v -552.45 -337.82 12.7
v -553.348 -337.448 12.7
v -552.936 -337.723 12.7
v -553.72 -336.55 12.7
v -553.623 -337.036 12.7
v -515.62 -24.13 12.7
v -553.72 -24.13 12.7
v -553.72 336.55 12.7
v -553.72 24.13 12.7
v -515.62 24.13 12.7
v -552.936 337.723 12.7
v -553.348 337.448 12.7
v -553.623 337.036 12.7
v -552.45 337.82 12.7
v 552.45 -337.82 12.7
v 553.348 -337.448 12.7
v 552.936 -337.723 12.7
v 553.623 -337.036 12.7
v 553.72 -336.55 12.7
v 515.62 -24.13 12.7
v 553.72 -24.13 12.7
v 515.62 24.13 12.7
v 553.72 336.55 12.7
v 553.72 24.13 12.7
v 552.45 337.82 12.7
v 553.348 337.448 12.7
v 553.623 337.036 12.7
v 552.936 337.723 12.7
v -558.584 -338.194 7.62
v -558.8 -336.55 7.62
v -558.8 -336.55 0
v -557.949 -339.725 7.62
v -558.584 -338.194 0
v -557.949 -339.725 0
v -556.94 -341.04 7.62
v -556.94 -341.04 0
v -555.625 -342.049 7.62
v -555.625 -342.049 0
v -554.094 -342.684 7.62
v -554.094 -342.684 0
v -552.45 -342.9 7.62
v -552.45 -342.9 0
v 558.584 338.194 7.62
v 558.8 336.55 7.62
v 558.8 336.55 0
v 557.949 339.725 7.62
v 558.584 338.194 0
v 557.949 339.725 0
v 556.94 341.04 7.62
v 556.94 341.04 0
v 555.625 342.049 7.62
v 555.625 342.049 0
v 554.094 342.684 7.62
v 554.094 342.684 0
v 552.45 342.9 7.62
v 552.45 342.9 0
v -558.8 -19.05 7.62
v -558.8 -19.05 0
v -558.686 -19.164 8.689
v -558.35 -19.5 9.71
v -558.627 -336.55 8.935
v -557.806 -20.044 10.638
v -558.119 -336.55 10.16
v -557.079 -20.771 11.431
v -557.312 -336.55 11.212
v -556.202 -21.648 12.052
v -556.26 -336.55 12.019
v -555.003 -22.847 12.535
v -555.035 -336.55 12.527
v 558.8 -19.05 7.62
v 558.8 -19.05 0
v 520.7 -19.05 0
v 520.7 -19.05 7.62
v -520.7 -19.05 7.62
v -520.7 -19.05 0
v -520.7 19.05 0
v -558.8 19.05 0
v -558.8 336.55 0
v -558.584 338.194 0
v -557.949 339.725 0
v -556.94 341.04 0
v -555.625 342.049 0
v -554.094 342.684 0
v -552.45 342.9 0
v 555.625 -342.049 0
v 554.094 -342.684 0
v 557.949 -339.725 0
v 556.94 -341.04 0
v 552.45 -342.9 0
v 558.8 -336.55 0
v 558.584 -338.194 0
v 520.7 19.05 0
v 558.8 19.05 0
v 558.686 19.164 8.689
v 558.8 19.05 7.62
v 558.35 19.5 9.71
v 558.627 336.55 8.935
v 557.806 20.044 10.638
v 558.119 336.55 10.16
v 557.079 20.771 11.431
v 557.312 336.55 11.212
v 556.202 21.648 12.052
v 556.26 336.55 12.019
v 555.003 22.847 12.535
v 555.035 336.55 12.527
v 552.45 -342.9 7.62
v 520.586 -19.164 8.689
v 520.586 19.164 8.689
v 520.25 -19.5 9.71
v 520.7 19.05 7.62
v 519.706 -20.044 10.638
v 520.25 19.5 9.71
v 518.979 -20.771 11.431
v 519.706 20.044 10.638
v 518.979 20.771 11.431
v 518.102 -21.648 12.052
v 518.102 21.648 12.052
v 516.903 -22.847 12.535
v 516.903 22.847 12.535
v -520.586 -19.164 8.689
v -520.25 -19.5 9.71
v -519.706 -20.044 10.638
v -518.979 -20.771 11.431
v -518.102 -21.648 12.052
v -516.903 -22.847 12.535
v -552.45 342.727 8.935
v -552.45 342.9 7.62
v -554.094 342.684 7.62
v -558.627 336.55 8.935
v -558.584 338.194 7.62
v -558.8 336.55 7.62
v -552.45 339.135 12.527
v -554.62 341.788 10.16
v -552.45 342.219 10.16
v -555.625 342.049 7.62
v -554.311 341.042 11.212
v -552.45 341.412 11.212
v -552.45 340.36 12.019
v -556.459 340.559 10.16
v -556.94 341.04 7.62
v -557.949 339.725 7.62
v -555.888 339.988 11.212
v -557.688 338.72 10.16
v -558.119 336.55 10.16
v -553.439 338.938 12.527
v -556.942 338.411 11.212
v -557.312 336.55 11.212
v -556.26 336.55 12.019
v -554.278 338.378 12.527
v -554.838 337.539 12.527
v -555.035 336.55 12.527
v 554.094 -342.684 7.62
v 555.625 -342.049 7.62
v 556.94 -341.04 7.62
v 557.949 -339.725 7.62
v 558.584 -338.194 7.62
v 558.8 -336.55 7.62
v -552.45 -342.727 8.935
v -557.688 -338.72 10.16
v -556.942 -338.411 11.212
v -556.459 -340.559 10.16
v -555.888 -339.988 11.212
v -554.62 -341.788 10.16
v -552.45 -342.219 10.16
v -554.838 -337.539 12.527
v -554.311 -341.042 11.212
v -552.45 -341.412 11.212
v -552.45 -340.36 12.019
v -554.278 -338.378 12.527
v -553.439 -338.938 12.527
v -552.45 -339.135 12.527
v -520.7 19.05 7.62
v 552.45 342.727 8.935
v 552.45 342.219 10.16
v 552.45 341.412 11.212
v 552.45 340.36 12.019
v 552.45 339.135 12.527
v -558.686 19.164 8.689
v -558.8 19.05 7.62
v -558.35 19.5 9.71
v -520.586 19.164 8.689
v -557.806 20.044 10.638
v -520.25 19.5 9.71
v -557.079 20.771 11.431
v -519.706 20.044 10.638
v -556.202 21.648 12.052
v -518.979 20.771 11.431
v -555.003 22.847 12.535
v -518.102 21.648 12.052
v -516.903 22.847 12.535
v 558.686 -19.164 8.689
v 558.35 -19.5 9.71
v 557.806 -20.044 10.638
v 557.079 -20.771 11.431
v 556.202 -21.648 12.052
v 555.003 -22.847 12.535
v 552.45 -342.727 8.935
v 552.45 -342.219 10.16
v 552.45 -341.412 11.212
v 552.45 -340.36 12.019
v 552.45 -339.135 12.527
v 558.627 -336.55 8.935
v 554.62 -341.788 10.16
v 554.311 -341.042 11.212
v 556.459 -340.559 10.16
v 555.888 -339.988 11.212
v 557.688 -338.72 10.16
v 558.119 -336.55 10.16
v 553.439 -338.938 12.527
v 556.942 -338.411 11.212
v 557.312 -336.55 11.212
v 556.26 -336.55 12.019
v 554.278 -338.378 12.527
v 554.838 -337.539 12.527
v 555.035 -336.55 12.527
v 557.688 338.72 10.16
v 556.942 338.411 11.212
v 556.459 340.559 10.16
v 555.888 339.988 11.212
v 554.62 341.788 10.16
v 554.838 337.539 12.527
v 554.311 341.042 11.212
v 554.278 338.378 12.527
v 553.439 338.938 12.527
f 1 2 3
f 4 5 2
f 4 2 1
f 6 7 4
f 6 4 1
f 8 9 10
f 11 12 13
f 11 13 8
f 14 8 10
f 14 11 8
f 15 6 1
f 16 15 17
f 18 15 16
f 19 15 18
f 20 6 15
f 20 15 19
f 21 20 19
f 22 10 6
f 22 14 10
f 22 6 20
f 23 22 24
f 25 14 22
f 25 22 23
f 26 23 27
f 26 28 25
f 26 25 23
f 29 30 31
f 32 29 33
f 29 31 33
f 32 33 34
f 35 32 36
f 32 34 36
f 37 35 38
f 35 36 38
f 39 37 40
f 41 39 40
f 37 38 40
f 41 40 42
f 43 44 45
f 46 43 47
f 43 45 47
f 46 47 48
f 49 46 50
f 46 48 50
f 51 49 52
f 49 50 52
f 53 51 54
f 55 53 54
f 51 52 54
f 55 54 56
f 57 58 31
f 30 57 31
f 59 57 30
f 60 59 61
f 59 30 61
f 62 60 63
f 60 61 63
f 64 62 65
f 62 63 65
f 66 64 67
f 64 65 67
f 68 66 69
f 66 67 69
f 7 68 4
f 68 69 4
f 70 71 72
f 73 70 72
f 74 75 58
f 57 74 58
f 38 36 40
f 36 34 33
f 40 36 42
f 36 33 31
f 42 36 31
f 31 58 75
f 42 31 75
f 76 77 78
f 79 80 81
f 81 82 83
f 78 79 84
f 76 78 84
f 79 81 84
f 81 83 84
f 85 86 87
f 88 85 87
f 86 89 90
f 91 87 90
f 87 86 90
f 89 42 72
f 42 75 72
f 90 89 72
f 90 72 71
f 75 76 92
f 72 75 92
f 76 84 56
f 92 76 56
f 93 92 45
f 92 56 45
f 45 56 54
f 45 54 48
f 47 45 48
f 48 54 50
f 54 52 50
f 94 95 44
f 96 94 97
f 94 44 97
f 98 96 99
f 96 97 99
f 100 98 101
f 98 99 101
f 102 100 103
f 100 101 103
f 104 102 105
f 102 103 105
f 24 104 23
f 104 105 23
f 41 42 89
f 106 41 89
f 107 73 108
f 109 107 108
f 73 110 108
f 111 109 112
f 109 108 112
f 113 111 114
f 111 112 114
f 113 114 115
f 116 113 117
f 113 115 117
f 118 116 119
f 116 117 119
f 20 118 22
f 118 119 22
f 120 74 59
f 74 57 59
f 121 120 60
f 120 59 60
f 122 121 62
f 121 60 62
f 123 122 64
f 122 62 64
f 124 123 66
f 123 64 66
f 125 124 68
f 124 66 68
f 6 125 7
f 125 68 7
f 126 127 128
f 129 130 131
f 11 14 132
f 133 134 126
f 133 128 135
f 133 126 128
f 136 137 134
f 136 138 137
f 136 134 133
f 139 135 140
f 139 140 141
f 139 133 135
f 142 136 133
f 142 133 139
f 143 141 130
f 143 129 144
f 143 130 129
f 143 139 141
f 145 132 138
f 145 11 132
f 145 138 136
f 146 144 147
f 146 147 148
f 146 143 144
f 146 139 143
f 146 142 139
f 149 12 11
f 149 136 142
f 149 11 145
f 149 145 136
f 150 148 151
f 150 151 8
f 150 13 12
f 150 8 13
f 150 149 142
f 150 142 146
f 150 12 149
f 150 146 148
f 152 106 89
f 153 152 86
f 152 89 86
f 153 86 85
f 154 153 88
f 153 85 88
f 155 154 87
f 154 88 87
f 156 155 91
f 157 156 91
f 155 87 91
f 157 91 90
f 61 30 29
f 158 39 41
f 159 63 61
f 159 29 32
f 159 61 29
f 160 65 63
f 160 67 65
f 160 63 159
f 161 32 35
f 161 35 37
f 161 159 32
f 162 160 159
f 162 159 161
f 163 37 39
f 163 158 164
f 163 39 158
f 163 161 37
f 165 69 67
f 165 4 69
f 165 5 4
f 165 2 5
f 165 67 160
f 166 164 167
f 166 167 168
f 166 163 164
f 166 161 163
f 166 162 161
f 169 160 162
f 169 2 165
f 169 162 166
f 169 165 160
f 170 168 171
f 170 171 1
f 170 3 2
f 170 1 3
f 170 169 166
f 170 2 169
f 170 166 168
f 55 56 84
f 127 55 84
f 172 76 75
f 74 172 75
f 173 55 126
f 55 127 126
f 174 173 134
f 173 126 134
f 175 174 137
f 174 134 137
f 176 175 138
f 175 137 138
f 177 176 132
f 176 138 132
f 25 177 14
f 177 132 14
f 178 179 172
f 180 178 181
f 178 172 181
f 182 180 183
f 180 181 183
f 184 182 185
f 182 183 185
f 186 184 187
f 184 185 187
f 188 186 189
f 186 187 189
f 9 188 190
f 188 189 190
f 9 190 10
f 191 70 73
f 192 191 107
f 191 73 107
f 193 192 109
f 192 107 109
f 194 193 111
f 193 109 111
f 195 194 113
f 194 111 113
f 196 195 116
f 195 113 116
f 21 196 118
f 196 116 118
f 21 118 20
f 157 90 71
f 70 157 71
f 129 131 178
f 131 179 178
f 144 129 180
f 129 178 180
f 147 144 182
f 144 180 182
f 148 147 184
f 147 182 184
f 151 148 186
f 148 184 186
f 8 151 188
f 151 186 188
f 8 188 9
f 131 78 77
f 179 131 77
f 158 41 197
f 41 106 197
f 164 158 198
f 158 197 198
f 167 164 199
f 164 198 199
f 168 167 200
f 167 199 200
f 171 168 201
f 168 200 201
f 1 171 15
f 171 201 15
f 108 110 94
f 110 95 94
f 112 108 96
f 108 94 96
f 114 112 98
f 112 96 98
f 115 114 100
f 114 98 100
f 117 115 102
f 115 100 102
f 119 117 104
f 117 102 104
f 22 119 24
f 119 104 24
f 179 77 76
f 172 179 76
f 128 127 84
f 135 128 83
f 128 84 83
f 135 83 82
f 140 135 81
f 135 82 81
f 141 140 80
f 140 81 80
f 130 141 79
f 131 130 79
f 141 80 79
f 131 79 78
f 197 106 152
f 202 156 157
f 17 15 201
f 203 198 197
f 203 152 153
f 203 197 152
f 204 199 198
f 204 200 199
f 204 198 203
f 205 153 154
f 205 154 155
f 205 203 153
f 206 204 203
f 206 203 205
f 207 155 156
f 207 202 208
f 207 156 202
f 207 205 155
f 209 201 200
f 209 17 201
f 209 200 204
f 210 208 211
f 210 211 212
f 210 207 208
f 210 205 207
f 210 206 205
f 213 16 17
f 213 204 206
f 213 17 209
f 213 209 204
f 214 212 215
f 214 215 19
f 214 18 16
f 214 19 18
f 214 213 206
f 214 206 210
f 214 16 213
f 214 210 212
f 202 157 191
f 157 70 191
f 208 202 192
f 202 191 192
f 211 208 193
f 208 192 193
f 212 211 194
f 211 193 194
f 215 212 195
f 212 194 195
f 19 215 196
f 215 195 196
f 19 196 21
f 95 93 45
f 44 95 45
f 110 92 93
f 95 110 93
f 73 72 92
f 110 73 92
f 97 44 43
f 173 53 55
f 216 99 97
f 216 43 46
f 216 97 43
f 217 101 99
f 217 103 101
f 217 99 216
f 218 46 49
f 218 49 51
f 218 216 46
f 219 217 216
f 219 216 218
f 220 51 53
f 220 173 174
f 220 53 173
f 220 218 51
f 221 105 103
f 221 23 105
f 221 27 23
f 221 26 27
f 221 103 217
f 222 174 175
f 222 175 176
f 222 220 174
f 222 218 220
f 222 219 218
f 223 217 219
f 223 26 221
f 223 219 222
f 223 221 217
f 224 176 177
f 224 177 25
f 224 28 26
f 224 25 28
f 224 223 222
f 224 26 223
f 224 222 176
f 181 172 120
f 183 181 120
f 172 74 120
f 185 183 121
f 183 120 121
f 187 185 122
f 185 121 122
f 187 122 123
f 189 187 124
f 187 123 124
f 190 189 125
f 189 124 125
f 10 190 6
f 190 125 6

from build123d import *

# Parameters (mm, degrees)
F1_DEPTH = 12.7
F2_R     = 5.08


with BuildPart() as f1:
    # F0 (on Top) → F1 (new body)
    with BuildSketch(Plane.XY):
        with BuildLine():
            Line((-552.45, -342.9), (552.45, -342.9))
            ThreePointArc((552.45, -342.9), (556.940128, -341.040128), (558.8, -336.55))
            Line((558.8, -336.55), (558.8, -19.05))
            Line((558.8, -19.05), (520.7, -19.05))
            Line((520.7, -19.05), (520.7, 19.05))
            Line((520.7, 19.05), (558.8, 19.05))
            Line((558.8, 19.05), (558.8, 336.55))
            ThreePointArc((558.8, 336.55), (556.940128, 341.040128), (552.45, 342.9))
            Line((552.45, 342.9), (-552.45, 342.9))
            ThreePointArc((-552.45, 342.9), (-556.940128, 341.040128), (-558.8, 336.55))
            Line((-558.8, 336.55), (-558.8, 19.05))
            Line((-558.8, 19.05), (-520.7, 19.05))
            Line((-520.7, 19.05), (-520.7, -19.05))
            Line((-520.7, -19.05), (-558.8, -19.05))
            Line((-558.8, -19.05), (-558.8, -336.55))
            ThreePointArc((-558.8, -336.55), (-556.940128, -341.040128), (-552.45, -342.9))
        make_face()
    extrude(amount=F1_DEPTH)

    # F2
    f2_edges = [f1.edges().sort_by_distance(p)[0] for p in [
        (-556.940128, 341.040128, 12.7),
        (-558.8, 177.8, 12.7),
        (-539.75, 19.05, 12.7),
        (-520.7, 0, 12.7),
        (-539.75, -19.05, 12.7),
        (-558.8, -177.8, 12.7),
        (-556.940128, -341.040128, 12.7),
        (0, -342.9, 12.7),
        (556.940128, -341.040128, 12.7),
        (558.8, -177.8, 12.7),
        (539.75, -19.05, 12.7),
        (520.7, 0, 12.7),
        (539.75, 19.05, 12.7),
        (558.8, 177.8, 12.7),
        (556.940128, 341.040128, 12.7),
        (0, 342.9, 12.7),
    ]]
    fillet(f2_edges, radius=F2_R)


solid = f1.part
